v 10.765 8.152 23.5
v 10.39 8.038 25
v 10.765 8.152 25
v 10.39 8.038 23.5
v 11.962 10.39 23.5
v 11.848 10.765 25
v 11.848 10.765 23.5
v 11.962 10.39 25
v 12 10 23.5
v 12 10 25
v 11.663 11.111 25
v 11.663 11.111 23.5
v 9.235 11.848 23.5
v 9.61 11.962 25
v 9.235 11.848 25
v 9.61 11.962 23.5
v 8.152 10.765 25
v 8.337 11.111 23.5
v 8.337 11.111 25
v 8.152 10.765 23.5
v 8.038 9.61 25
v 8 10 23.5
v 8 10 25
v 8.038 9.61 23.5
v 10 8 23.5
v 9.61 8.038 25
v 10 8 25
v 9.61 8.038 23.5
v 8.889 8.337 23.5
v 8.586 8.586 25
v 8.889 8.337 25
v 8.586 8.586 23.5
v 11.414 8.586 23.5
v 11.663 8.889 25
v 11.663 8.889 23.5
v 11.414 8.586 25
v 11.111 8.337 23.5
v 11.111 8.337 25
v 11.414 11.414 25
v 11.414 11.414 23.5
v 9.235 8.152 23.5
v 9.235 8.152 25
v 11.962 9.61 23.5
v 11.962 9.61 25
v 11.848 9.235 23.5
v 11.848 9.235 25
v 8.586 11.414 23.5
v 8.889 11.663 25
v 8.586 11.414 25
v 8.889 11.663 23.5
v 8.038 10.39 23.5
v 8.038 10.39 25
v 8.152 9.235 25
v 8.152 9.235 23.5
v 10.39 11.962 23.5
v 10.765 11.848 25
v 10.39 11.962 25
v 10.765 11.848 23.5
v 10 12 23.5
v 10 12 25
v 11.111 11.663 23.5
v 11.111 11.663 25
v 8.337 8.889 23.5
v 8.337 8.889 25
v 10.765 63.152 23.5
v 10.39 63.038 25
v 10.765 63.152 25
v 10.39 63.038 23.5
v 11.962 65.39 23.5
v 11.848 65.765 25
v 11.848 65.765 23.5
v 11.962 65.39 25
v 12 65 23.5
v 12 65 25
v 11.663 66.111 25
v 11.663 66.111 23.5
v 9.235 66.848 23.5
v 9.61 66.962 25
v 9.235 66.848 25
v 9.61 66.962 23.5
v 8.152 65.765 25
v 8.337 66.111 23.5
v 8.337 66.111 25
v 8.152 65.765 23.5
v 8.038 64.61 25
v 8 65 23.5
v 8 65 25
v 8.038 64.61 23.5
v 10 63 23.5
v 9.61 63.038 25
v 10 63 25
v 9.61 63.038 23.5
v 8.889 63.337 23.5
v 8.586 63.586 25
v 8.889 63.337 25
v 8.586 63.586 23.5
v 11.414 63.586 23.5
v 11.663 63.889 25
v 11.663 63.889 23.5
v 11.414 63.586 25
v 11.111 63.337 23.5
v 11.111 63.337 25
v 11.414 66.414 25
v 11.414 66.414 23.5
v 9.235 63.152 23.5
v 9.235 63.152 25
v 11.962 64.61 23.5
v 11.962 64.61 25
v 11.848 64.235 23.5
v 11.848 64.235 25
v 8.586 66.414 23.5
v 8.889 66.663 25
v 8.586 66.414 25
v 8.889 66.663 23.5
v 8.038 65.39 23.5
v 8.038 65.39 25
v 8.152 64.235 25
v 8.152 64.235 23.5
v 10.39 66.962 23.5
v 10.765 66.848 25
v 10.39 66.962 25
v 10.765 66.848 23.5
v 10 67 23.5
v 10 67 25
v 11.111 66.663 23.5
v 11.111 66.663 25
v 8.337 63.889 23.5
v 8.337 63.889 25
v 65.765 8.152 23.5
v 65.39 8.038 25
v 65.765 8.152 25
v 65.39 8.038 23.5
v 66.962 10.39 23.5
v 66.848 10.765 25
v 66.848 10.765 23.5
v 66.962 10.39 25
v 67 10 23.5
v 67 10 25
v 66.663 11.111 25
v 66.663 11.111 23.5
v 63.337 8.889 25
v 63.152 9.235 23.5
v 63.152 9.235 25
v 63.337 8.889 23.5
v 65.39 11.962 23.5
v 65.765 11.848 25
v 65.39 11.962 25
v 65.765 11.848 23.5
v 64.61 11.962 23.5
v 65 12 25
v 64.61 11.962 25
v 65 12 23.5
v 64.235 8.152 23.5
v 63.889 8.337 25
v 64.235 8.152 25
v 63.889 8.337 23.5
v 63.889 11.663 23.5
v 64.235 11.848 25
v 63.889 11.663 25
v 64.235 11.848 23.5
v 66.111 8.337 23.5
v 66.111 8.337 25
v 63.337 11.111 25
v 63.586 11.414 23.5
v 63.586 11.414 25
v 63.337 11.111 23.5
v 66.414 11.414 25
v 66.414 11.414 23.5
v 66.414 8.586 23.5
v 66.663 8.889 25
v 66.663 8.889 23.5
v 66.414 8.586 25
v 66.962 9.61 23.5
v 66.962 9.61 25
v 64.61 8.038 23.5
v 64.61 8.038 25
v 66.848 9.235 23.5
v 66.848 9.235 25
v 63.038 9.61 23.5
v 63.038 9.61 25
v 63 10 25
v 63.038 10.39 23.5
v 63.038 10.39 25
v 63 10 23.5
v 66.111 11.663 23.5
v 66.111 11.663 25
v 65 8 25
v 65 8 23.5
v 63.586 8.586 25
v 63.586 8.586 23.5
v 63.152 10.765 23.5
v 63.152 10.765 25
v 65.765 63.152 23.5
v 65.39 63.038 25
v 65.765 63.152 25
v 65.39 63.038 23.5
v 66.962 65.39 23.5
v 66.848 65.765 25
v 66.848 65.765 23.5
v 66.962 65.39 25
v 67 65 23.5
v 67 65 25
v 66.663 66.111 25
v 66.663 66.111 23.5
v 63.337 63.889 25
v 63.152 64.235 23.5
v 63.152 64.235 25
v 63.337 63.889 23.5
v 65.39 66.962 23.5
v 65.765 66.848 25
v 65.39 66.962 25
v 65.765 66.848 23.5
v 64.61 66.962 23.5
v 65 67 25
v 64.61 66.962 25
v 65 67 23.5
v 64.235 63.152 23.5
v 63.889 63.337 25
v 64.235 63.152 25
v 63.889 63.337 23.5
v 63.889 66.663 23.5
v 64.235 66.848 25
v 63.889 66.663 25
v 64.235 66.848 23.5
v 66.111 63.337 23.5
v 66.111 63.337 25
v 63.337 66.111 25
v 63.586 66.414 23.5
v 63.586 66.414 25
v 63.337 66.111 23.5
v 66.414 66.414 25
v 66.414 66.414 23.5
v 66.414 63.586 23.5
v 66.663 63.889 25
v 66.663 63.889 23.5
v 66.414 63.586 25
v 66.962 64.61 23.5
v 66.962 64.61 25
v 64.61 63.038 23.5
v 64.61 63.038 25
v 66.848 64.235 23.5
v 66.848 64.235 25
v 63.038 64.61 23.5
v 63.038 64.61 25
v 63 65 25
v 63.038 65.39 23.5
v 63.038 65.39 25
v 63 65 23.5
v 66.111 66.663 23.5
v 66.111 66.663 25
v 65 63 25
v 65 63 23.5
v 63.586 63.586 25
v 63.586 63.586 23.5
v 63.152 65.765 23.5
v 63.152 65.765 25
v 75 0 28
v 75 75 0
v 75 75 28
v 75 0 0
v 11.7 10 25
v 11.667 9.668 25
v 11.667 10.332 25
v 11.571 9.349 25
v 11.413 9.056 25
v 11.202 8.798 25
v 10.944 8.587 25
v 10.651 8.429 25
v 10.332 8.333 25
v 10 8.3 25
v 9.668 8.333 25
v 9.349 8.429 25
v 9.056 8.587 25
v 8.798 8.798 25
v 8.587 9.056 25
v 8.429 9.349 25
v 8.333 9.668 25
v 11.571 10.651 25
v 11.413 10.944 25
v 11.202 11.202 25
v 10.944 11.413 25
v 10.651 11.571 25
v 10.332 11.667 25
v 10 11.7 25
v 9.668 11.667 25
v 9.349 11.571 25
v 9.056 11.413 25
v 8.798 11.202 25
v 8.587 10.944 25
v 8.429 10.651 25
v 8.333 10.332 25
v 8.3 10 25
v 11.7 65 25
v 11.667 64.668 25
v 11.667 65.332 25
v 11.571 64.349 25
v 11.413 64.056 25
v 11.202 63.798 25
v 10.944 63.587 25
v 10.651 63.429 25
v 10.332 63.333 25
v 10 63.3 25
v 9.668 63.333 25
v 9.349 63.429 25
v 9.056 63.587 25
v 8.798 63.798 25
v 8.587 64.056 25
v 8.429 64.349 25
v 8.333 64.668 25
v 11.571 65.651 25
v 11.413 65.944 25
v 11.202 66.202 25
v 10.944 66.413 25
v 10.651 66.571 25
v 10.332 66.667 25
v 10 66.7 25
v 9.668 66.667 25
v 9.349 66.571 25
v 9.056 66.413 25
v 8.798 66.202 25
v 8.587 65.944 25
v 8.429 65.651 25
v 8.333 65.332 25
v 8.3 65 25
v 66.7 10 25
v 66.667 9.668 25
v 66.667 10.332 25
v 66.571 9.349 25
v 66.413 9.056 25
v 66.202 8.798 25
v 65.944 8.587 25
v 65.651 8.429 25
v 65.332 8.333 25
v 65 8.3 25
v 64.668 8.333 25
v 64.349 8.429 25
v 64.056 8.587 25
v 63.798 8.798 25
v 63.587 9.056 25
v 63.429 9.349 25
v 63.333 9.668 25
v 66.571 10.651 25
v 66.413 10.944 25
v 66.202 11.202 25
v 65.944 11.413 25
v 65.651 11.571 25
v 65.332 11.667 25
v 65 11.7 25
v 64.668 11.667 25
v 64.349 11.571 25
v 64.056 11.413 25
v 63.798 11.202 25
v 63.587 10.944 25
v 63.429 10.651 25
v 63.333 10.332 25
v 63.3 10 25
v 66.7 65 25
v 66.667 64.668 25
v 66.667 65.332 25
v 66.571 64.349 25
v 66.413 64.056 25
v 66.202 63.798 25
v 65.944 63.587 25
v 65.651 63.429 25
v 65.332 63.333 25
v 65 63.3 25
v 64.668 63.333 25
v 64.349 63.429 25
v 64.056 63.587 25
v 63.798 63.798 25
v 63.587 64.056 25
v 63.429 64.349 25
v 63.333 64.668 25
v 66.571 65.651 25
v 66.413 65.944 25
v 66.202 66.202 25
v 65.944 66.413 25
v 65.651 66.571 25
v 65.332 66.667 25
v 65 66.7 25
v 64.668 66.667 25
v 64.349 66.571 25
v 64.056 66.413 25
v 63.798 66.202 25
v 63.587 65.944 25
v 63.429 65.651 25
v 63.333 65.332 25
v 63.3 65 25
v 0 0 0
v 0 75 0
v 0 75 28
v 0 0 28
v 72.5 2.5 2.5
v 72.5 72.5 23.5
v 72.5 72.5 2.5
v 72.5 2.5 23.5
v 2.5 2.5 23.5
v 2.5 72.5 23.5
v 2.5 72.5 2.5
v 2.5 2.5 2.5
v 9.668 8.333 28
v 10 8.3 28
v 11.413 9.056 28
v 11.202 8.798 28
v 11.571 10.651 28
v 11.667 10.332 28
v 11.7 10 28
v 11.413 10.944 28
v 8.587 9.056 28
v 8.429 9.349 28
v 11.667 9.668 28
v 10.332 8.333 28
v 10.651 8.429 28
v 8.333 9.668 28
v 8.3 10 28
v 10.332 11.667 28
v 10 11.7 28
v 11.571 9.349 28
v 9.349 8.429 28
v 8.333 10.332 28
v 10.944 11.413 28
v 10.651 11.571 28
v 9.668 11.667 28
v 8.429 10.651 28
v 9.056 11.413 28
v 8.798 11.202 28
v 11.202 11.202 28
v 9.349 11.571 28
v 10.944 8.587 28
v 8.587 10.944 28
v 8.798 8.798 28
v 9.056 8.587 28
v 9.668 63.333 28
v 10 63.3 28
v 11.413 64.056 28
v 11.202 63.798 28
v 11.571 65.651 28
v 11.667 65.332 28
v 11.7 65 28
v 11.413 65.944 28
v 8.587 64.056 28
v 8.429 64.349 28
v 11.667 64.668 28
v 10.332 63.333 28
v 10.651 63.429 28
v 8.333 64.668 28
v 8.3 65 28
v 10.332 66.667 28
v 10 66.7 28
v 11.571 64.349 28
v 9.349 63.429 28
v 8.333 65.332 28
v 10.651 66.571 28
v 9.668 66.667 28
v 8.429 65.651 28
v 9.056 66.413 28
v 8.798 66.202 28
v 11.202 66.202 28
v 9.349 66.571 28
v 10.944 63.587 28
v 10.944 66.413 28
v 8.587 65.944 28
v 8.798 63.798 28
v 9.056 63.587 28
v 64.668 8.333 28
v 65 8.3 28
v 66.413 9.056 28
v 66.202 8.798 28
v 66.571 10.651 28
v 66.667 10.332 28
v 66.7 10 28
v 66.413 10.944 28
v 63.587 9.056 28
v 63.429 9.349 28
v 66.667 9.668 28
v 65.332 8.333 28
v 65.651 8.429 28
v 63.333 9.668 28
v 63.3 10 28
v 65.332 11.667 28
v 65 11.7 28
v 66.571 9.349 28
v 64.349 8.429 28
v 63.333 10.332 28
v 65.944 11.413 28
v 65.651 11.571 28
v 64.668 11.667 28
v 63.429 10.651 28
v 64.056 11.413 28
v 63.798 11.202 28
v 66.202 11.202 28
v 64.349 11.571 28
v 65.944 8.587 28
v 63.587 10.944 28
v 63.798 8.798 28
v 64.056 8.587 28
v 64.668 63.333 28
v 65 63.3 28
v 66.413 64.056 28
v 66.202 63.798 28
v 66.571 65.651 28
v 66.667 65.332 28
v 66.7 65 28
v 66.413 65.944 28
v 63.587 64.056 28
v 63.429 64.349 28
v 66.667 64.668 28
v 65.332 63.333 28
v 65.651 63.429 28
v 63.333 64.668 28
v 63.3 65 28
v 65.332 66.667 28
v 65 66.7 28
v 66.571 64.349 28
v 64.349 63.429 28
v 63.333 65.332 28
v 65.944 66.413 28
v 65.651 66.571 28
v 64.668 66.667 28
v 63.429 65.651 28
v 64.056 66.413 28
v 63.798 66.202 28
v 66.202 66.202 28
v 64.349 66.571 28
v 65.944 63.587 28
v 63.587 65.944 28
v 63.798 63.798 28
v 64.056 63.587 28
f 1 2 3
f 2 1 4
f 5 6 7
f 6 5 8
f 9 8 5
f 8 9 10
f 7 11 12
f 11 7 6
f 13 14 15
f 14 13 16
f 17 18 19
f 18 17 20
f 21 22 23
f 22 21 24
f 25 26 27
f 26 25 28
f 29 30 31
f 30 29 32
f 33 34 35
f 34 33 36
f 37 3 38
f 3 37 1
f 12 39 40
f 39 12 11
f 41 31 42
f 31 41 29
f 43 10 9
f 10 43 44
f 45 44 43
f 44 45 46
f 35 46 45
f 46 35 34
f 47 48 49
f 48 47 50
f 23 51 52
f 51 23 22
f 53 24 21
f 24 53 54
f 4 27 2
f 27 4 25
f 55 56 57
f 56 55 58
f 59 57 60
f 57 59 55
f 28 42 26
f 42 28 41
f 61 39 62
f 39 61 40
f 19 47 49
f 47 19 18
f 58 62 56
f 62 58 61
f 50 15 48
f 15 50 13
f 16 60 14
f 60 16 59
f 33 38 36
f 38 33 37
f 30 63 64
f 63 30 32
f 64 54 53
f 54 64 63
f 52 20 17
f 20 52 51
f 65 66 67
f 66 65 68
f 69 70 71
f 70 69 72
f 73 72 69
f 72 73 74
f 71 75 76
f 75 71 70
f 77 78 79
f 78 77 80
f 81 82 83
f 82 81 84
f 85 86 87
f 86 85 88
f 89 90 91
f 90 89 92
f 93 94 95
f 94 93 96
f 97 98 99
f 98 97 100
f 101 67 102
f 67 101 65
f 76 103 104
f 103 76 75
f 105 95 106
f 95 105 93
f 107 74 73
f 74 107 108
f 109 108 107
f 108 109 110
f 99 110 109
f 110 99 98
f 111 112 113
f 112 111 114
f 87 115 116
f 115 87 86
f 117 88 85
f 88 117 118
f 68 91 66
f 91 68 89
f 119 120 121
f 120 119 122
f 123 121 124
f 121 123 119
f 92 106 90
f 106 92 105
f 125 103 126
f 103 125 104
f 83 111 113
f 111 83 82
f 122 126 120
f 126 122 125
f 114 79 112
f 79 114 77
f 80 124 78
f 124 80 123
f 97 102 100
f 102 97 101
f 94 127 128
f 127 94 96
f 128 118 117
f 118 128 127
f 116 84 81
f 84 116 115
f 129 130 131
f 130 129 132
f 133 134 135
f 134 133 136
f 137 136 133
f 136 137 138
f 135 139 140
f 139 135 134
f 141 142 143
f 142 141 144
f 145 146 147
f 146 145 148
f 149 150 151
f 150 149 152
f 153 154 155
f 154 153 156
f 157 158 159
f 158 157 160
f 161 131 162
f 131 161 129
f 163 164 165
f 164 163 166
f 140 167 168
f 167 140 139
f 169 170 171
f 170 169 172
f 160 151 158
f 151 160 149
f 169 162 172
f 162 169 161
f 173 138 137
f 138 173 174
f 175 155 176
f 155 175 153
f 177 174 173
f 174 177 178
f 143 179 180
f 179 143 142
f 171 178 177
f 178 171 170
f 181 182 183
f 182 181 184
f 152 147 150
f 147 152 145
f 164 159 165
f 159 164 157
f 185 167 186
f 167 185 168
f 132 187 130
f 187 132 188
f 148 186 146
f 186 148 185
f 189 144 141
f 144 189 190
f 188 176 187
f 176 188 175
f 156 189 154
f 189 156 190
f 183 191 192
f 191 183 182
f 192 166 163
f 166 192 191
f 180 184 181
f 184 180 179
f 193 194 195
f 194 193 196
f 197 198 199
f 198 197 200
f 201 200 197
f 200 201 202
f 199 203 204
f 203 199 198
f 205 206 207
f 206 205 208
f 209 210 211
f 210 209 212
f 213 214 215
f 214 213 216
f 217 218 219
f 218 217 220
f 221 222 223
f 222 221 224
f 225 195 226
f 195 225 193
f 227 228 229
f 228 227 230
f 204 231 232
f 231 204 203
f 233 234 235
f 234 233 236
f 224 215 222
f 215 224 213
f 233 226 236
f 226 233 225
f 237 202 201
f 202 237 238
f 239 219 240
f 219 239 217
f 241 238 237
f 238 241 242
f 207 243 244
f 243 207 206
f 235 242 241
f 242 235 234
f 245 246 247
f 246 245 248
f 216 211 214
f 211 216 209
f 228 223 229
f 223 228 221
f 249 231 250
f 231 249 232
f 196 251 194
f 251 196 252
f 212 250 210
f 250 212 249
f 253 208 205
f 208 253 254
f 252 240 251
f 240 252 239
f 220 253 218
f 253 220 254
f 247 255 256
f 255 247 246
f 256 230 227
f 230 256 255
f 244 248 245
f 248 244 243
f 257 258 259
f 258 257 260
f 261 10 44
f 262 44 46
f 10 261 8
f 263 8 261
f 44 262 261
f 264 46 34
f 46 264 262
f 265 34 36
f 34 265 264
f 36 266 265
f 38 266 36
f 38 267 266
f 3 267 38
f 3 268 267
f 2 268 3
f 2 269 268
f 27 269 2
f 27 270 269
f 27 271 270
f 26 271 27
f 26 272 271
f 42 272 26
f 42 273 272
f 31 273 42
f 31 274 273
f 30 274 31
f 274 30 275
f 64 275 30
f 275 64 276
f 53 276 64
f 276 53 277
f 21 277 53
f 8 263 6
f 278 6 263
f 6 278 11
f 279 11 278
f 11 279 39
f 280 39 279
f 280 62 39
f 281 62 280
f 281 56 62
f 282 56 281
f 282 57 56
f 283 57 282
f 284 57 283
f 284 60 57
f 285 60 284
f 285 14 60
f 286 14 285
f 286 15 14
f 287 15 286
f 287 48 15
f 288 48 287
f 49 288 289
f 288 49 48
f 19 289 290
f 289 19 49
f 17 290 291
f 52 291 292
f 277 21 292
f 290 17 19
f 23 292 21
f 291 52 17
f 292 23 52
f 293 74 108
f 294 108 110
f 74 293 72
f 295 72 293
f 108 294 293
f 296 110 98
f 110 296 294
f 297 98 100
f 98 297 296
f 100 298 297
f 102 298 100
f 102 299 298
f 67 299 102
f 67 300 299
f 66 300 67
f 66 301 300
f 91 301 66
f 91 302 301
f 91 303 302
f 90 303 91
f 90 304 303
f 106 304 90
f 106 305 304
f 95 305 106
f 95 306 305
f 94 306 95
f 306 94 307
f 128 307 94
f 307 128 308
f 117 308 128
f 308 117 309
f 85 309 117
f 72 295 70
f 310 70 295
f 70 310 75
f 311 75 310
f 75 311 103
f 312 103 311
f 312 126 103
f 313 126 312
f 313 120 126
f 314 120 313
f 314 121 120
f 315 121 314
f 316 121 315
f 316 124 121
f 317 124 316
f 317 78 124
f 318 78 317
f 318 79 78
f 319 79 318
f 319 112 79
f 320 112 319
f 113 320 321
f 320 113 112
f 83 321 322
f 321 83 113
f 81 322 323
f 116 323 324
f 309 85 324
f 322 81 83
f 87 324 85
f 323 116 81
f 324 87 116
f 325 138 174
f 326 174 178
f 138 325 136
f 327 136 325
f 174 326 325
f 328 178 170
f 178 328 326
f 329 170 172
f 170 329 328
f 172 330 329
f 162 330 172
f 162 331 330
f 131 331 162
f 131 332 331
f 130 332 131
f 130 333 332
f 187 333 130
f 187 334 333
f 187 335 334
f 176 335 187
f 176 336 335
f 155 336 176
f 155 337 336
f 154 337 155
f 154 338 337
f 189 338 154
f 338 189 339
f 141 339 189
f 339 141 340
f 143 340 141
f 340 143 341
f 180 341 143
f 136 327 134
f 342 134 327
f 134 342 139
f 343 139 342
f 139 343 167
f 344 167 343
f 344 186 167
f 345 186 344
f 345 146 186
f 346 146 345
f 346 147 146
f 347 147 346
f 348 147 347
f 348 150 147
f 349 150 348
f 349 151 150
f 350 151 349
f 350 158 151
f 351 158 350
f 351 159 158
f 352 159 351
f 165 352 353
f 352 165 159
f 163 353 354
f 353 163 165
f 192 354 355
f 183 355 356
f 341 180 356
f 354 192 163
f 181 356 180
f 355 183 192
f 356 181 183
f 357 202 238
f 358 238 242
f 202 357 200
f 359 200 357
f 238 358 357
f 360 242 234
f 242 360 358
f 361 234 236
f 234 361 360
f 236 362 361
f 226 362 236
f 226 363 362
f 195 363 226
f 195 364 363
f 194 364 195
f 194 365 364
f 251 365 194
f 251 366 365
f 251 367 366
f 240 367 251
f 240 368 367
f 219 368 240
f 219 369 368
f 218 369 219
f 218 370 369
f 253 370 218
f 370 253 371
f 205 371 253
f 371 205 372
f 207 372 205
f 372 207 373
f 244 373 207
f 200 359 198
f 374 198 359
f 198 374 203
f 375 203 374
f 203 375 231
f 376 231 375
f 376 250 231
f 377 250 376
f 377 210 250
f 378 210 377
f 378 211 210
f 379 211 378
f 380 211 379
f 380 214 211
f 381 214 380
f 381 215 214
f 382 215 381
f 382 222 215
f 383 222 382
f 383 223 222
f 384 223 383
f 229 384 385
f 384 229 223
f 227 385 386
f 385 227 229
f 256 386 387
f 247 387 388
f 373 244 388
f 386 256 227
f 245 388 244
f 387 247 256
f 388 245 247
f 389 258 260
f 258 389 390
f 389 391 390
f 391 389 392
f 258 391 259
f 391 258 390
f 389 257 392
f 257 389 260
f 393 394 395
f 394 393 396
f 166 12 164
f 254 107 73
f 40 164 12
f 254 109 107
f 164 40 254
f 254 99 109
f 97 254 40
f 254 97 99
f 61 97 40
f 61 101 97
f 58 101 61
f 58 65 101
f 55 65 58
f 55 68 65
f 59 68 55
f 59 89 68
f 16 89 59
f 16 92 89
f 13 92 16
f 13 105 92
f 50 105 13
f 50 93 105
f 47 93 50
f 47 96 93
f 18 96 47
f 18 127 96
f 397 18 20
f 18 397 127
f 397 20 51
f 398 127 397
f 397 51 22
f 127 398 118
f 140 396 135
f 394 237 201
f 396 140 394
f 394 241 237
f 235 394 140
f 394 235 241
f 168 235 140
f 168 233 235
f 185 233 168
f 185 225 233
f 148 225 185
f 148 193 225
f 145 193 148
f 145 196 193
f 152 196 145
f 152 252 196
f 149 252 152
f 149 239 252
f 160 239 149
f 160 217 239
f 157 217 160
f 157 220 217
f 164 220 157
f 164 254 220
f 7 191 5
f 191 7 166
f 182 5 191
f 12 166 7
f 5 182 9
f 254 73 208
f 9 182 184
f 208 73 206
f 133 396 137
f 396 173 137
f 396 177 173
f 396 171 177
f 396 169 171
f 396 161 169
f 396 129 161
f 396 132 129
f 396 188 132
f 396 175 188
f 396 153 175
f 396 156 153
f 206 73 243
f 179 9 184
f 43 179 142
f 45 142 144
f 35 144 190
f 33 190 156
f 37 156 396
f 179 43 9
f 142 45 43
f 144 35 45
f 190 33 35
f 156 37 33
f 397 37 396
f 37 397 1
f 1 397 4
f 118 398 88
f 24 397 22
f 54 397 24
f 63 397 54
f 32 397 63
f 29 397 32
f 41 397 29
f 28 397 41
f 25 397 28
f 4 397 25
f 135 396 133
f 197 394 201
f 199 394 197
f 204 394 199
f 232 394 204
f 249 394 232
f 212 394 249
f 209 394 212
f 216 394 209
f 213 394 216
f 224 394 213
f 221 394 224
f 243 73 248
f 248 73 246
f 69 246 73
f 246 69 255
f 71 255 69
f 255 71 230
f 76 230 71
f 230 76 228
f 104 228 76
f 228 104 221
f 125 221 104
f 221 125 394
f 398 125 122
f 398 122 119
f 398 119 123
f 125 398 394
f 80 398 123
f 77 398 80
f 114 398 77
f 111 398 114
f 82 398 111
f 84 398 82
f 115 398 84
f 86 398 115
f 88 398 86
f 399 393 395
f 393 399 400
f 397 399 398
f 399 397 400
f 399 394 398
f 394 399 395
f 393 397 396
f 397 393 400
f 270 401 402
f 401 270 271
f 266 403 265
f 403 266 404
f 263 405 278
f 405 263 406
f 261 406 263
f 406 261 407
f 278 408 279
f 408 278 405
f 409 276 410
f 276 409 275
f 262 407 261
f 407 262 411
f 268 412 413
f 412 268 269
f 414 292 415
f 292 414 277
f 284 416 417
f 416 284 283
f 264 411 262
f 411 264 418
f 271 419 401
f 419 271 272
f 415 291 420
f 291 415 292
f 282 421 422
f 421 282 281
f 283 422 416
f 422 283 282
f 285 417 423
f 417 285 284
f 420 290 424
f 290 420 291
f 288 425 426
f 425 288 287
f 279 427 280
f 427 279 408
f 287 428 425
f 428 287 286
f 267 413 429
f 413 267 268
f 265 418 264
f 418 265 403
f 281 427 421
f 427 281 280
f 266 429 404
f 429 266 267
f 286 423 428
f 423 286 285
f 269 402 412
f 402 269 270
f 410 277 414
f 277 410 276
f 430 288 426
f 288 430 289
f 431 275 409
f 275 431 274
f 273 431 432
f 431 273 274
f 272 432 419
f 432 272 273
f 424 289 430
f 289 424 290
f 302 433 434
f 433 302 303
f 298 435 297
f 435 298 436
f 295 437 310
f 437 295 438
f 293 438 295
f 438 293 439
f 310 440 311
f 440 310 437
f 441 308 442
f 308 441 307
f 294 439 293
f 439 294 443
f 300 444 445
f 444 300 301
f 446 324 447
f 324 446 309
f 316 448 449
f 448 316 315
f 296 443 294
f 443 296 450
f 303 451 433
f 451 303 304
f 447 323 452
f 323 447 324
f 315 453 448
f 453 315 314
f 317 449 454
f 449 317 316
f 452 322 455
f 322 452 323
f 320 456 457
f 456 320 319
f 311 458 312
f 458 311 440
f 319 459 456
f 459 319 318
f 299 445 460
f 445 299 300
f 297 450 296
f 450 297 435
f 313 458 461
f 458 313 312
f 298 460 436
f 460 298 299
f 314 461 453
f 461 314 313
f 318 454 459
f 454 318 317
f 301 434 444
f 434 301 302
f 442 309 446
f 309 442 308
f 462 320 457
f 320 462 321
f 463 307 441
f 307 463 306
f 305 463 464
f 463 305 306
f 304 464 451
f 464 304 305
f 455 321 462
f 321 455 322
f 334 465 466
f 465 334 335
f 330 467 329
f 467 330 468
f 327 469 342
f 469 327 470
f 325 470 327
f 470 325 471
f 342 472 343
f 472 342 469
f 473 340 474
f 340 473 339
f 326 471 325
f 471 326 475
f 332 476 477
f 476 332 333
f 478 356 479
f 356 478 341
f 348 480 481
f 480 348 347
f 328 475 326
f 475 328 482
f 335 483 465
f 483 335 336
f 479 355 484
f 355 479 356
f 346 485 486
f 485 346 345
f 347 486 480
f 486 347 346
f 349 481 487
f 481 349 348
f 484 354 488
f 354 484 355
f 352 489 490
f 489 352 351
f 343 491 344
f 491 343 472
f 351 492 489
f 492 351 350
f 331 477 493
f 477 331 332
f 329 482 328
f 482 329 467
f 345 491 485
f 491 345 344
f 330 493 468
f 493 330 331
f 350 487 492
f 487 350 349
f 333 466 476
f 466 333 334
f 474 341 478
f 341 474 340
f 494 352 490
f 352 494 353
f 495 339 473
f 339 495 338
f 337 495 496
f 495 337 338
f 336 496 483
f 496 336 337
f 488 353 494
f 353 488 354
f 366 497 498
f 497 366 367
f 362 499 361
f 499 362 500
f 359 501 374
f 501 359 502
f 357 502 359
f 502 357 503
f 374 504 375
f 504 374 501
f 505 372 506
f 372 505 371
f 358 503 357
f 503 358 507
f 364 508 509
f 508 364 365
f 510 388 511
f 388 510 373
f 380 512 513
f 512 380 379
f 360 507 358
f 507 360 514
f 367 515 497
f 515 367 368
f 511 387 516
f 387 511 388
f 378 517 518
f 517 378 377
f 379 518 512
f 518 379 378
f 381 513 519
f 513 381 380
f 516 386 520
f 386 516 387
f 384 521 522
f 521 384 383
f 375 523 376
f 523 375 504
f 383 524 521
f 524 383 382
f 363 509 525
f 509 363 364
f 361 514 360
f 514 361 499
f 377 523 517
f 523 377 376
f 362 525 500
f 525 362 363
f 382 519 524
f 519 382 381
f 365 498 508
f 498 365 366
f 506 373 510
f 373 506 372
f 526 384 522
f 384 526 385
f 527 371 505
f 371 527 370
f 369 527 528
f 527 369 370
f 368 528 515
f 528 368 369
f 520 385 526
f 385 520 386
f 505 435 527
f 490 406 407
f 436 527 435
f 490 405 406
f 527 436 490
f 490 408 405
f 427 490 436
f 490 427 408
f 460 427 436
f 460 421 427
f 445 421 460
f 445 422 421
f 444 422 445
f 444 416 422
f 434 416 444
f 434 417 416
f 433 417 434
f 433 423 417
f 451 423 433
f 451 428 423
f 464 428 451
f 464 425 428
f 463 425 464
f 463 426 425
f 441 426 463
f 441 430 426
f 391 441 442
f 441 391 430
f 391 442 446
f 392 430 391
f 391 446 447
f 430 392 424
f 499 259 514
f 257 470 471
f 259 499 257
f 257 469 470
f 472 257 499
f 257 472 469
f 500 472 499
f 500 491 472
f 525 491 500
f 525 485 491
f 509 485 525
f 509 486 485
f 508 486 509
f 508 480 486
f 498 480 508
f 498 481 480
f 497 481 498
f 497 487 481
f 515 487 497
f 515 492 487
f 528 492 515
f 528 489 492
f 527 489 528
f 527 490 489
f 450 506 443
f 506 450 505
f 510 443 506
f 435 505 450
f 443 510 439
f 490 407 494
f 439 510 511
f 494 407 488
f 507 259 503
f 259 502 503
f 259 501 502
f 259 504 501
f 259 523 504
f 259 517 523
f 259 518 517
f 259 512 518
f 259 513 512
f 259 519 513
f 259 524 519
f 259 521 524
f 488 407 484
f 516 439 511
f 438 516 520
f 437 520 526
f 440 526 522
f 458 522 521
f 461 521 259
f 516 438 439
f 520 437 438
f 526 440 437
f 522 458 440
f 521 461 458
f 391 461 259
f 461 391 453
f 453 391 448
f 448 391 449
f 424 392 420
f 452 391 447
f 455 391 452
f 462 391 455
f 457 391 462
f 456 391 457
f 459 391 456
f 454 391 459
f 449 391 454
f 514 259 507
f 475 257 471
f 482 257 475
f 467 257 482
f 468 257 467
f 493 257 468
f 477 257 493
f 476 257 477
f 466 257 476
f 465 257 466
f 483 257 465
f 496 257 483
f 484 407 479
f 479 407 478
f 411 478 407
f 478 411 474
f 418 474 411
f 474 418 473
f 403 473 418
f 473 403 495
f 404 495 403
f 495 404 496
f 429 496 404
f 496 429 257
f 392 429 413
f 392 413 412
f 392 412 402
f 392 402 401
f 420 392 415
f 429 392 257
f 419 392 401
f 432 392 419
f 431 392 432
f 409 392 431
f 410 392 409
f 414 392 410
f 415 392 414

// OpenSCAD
// Two-part enclosure with M3 fasteners
// Cavity: 70 x 70 x 20 mm | Wall: 2.5 mm

cavity_w = 70;
cavity_h = 70;
cavity_d = 20;
wall = 2.5;

outer_w = 75;
outer_h = 75;
base_z = 25;

insert_hole_dia = 4.0;
insert_hole_depth = 4.0;
screw_clearance = 3.4;

corners = [
  [10, 10],
  [10, 65],
  [65, 10],
  [65, 65]
];

module base() {
  difference() {
    cube([outer_w, outer_h, base_z]);
    
    translate([wall, wall, wall])
      cube([cavity_w, cavity_h, cavity_d + 1]);
    
    for (c = corners)
      translate([c[0], c[1], base_z - insert_hole_depth])
        cylinder(d=insert_hole_dia, h=insert_hole_depth + 1, $fn=32);
  }
}

module lid() {
  difference() {
    cube([outer_w, outer_h, 3]);
    
    for (c = corners)
      translate([c[0], c[1], -1])
        cylinder(d=screw_clearance, h=5, $fn=32);
  }
}

base();
translate([0, 0, base_z])
  lid();

echo("BOM: 4x MB-SHCS-M3-08 (M3 socket head cap screw, 8mm length), 4x MB-HSI-M3 (M3 heat-set insert)");
